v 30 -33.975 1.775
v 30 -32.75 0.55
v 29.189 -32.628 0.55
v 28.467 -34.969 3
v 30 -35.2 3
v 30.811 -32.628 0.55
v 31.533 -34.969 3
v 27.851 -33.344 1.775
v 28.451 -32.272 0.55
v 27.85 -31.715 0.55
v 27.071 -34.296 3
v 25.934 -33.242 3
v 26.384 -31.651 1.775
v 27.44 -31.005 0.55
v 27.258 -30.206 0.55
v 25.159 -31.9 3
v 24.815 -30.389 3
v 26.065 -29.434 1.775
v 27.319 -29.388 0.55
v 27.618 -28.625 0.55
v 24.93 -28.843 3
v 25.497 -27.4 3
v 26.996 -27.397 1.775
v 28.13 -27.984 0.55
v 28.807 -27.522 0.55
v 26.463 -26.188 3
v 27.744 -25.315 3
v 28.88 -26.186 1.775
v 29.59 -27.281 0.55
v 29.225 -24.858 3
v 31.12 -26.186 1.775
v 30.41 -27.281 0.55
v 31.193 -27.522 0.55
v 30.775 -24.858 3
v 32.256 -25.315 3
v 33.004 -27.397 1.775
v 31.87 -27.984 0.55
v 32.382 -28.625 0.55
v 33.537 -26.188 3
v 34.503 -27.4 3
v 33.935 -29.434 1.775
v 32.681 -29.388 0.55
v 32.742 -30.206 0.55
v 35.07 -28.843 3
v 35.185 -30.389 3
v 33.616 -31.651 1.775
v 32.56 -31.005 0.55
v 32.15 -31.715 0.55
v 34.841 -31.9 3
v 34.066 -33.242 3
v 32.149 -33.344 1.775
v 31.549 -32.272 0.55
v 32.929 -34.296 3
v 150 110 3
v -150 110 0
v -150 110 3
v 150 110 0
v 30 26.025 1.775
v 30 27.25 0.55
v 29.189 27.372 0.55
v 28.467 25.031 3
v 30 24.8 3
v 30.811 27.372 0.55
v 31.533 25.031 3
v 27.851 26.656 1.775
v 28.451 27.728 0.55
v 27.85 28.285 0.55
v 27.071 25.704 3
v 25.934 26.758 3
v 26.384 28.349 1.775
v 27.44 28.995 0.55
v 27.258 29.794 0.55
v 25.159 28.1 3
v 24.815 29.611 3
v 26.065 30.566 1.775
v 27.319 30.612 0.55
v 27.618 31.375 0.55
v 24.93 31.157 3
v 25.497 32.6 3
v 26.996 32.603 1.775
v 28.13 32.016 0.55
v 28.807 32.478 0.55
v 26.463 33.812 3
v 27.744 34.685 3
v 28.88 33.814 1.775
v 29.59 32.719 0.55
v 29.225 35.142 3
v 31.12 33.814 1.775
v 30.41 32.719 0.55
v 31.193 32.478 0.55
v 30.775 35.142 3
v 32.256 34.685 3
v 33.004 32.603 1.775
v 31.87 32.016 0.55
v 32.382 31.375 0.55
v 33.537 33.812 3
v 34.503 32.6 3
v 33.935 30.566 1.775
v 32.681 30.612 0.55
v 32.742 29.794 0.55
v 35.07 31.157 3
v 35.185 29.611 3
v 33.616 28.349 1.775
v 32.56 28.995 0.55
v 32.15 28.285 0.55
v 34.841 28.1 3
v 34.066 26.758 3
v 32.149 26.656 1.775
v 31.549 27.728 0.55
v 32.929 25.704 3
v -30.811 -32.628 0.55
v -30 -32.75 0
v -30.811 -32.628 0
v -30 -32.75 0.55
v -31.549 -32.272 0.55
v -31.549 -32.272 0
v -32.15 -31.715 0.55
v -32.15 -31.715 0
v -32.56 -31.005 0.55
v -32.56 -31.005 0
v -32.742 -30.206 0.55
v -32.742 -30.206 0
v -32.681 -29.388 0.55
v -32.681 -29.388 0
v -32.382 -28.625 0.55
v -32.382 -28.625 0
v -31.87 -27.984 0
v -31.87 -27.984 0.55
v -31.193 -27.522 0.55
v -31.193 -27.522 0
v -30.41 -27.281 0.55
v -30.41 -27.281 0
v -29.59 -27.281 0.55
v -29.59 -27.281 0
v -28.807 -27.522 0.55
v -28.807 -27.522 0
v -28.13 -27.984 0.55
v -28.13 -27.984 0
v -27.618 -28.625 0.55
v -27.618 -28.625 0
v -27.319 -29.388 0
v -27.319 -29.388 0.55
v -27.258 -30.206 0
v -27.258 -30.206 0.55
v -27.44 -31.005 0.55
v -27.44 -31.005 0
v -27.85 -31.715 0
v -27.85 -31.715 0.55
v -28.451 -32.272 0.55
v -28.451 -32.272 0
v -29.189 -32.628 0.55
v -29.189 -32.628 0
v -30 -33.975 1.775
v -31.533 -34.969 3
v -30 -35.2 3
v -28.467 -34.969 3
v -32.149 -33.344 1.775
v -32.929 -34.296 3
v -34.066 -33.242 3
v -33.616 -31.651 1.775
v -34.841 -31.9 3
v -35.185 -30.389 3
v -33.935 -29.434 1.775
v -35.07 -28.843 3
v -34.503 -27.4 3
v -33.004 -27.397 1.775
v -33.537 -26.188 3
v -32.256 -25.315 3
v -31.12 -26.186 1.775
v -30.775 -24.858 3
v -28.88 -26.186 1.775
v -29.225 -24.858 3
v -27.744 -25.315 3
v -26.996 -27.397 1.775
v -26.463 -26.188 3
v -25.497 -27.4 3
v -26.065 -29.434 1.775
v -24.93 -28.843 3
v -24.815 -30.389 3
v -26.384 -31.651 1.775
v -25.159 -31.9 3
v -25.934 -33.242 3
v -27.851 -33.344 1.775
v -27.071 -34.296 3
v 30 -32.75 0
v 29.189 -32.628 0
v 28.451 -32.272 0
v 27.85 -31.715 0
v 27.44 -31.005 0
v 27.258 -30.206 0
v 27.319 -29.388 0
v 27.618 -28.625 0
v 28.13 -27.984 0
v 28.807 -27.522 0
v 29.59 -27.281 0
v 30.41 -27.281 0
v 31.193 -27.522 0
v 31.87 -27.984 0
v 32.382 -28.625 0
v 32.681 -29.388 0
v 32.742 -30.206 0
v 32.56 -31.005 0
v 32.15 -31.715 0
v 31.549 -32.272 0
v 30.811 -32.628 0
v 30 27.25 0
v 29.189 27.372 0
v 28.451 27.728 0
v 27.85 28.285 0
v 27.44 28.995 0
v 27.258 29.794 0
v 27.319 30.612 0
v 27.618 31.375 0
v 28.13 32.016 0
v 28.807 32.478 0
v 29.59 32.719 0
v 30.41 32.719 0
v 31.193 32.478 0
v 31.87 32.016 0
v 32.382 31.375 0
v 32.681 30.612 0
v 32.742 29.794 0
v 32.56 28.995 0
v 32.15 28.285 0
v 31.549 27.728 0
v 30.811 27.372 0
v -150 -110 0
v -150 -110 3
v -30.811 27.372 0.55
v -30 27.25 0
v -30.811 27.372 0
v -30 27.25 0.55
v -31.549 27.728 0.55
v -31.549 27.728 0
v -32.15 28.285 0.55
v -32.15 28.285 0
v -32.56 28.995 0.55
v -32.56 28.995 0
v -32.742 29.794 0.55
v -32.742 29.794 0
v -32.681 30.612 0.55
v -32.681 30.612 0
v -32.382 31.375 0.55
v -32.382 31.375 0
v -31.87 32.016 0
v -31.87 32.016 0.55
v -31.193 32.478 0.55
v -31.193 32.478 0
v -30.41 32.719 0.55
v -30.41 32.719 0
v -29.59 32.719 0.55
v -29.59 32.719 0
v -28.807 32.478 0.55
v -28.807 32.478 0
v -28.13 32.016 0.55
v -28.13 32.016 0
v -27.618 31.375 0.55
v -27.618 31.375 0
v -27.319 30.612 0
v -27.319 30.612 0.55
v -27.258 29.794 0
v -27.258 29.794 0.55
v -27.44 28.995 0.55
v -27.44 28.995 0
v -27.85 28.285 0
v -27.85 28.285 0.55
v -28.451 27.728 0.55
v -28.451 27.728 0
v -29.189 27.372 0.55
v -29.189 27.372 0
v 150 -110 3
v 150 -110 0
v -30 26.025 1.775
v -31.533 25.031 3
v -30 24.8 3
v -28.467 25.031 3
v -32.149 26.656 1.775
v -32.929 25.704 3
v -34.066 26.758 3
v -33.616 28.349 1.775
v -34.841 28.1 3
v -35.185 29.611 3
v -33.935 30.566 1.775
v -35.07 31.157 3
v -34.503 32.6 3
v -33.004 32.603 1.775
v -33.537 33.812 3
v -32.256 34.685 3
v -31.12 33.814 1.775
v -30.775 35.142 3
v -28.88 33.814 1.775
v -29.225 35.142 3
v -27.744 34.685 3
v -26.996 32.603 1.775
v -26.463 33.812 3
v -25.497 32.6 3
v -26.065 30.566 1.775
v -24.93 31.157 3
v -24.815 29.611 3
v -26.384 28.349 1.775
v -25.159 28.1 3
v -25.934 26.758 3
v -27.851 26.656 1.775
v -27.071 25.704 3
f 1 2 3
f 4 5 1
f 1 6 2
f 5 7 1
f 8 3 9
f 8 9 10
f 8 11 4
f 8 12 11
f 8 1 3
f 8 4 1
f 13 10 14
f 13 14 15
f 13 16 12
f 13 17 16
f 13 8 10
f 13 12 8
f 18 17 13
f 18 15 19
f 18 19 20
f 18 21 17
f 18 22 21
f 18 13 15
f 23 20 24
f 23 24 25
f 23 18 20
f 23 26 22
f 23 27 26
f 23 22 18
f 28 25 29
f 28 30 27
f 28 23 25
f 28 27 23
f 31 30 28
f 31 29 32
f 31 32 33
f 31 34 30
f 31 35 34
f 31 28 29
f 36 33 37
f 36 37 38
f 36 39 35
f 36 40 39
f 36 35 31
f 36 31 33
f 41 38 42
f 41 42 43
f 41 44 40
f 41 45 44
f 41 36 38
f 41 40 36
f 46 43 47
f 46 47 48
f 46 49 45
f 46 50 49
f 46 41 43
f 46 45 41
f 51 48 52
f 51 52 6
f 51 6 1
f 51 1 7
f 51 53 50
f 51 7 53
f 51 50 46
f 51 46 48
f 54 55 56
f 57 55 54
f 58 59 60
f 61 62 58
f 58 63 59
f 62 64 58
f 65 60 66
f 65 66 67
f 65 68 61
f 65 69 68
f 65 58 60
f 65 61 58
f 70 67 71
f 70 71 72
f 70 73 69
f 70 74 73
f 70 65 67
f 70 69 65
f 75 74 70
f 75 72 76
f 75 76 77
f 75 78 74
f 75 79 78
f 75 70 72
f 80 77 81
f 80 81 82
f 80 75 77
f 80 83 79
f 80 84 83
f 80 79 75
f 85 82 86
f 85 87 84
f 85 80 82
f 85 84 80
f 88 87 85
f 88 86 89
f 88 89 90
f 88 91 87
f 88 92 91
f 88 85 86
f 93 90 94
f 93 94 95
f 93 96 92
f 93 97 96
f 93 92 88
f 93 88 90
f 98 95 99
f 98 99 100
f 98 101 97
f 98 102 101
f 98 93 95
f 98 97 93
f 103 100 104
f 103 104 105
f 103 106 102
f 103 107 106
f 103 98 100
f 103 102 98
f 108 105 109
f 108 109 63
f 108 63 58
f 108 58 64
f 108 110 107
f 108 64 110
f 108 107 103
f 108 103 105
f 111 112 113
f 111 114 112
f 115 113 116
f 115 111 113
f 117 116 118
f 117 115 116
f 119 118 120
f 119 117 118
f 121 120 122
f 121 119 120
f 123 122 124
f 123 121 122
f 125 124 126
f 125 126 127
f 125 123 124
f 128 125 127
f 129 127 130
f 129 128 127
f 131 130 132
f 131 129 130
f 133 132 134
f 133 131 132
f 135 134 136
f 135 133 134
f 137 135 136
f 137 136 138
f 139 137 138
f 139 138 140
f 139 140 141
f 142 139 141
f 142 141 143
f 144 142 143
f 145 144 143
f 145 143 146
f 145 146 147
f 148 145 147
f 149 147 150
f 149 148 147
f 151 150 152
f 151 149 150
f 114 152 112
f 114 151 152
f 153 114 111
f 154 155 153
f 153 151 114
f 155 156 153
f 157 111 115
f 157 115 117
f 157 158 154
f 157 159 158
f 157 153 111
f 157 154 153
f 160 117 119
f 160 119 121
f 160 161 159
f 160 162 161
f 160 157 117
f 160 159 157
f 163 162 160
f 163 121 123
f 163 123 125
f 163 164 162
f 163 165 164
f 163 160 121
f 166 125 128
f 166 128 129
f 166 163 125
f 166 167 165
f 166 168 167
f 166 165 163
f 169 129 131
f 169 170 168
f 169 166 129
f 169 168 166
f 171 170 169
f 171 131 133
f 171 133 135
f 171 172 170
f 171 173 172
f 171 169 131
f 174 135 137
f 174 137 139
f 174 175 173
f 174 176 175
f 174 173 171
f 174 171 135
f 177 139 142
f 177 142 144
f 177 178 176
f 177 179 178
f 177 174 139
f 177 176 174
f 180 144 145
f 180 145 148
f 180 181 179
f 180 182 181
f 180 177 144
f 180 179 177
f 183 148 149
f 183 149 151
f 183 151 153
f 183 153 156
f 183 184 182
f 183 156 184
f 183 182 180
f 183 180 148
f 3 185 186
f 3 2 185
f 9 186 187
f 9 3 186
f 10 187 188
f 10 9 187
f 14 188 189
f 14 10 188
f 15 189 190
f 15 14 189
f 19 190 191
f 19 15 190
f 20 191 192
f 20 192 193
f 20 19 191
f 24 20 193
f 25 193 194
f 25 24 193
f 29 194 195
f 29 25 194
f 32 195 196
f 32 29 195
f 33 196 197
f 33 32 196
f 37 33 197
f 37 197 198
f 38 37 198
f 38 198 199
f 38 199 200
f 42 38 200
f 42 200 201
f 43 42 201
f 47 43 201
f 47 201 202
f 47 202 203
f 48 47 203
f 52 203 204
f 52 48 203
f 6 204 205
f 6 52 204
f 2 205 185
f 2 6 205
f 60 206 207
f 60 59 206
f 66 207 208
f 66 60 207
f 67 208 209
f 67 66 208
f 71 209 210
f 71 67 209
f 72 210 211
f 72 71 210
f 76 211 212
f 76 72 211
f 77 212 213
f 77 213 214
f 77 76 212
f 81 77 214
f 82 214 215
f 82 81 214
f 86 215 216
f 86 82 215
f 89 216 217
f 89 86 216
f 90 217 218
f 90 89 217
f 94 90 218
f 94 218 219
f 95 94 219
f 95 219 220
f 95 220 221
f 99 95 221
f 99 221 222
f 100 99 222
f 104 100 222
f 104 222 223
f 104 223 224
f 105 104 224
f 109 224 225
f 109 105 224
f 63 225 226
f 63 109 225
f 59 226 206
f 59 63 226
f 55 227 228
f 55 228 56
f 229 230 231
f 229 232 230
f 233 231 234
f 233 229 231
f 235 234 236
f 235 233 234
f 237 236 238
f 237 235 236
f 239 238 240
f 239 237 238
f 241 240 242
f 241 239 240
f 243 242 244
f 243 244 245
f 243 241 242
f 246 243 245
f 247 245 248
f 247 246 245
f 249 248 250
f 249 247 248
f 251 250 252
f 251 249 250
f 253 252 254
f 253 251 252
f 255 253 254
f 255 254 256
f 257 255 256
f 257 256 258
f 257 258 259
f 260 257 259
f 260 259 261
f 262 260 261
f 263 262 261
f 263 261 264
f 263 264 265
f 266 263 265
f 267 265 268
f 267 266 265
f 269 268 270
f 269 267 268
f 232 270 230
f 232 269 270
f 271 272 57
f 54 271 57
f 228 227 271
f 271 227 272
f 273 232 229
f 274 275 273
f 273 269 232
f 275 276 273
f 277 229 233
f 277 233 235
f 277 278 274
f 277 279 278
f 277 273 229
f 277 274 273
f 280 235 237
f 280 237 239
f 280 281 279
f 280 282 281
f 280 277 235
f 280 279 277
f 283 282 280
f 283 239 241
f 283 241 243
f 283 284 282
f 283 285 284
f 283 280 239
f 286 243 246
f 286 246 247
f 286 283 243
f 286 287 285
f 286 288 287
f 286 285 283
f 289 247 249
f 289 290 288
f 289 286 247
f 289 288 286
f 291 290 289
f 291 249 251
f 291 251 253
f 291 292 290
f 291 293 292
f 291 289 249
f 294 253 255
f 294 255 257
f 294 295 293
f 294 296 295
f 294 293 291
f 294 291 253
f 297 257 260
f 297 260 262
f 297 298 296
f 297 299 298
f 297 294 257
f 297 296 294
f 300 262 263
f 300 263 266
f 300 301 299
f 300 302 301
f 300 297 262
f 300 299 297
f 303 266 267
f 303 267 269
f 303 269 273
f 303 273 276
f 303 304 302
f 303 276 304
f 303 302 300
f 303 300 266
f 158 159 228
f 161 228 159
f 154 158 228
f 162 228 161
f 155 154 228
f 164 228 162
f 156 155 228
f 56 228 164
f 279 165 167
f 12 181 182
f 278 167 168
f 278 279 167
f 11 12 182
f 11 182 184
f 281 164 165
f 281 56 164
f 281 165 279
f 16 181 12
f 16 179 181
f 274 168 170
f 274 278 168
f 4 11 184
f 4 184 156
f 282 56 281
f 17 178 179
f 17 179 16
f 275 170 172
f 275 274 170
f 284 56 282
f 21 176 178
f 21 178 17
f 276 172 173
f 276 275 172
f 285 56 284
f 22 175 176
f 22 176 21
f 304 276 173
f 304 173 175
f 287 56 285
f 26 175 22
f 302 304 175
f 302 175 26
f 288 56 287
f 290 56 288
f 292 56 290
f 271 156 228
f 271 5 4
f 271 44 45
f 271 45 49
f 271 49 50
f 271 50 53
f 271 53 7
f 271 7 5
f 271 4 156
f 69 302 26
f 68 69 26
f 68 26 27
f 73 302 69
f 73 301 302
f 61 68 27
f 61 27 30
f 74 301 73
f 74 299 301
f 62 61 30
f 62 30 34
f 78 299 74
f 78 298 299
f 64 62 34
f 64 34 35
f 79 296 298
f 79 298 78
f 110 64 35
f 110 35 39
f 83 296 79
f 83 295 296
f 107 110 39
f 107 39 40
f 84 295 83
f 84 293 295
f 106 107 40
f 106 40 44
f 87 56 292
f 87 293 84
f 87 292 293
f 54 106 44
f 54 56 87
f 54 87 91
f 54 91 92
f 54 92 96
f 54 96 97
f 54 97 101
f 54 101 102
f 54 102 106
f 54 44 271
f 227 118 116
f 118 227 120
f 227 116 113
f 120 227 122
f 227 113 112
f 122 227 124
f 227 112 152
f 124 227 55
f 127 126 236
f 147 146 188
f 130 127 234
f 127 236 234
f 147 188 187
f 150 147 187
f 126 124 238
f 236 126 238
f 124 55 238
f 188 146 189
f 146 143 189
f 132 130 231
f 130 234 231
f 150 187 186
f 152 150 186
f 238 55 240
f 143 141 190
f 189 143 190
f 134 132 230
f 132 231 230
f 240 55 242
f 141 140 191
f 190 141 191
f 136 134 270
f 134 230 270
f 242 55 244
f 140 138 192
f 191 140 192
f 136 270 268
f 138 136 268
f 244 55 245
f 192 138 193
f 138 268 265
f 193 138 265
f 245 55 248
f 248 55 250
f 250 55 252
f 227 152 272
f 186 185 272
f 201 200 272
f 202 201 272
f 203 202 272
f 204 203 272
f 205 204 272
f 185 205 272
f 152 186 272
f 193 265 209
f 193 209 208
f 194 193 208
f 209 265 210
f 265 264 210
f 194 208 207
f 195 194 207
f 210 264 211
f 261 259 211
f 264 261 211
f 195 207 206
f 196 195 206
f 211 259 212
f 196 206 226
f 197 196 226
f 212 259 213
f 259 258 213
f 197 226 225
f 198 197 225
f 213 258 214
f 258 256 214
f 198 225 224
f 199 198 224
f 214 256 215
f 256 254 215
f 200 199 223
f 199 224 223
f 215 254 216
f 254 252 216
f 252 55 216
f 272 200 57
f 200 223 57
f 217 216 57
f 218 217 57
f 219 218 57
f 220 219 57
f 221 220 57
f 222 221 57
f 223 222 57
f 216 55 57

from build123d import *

# Parameters (mm, degrees)
SKETCH1_W                                   = 300
SKETCH1_H                                   = 220
BOSS_EXTRUDE1_DEPTH                         = 3
FRAISAGE_POUR_VIS_T_TE_FRAIS_E_M51_AT_COUNT = 2
FRAISAGE_POUR_VIS_T_TE_FRAIS_E_M51_AT_PITCH = 60
FRAISAGE_POUR_VIS_T_TE_FRAIS_E_M51_2_COUNT  = 2
FRAISAGE_POUR_VIS_T_TE_FRAIS_E_M51_2_PITCH  = 60
FRAISAGE_POUR_VIS_T_TE_FRAIS_E_M51_3_COUNT  = 2
FRAISAGE_POUR_VIS_T_TE_FRAIS_E_M51_3_PITCH  = 84.852813742


with BuildPart() as part:
    # Sketch1 → Boss-Extrude1 (new body)
    with BuildSketch(Plane.XY):
        Rectangle(SKETCH1_W, SKETCH1_H)
    extrude(amount=BOSS_EXTRUDE1_DEPTH)

    # Sketch5 → Fraisage pour vis à tête fraisée M51 (revolve, cut)
    with BuildSketch(Plane(origin=(-30, 30, 3), x_dir=(0, -1, 0), z_dir=(1, 0, 0))):
        Polygon((0, 0), (0, 3), (2.75, 3), (2.75, 2.45), (5.2, 0), align=None)
    fraisage_pour_vis_t_te_frais_e_m51 = revolve(axis=Axis((-30, 30, 9.35), (0, 0, -1)), mode=Mode.SUBTRACT)

    # Fraisage pour vis à tête fraisée M51 at: Fraisage pour vis à tête fraisée M51 ×2
    with Locations(*[(i * FRAISAGE_POUR_VIS_T_TE_FRAIS_E_M51_AT_PITCH, 0, 0) for i in range(1, FRAISAGE_POUR_VIS_T_TE_FRAIS_E_M51_AT_COUNT)]):
        add(fraisage_pour_vis_t_te_frais_e_m51, mode=Mode.SUBTRACT)

    # Fraisage pour vis _ t_te frais_e M51 2: Fraisage pour vis à tête fraisée M51 ×2
    with Locations(*[(0, -i * FRAISAGE_POUR_VIS_T_TE_FRAIS_E_M51_2_PITCH, 0) for i in range(1, FRAISAGE_POUR_VIS_T_TE_FRAIS_E_M51_2_COUNT)]):
        add(fraisage_pour_vis_t_te_frais_e_m51, mode=Mode.SUBTRACT)

    # Fraisage pour vis _ t_te frais_e M51 3: Fraisage pour vis à tête fraisée M51 ×2
    with Locations(*[Vector(0.7071067811865489, -0.7071067811865462, 0) * (i * FRAISAGE_POUR_VIS_T_TE_FRAIS_E_M51_3_PITCH) for i in range(1, FRAISAGE_POUR_VIS_T_TE_FRAIS_E_M51_3_COUNT)]):
        add(fraisage_pour_vis_t_te_frais_e_m51, mode=Mode.SUBTRACT)


solid = part.part
